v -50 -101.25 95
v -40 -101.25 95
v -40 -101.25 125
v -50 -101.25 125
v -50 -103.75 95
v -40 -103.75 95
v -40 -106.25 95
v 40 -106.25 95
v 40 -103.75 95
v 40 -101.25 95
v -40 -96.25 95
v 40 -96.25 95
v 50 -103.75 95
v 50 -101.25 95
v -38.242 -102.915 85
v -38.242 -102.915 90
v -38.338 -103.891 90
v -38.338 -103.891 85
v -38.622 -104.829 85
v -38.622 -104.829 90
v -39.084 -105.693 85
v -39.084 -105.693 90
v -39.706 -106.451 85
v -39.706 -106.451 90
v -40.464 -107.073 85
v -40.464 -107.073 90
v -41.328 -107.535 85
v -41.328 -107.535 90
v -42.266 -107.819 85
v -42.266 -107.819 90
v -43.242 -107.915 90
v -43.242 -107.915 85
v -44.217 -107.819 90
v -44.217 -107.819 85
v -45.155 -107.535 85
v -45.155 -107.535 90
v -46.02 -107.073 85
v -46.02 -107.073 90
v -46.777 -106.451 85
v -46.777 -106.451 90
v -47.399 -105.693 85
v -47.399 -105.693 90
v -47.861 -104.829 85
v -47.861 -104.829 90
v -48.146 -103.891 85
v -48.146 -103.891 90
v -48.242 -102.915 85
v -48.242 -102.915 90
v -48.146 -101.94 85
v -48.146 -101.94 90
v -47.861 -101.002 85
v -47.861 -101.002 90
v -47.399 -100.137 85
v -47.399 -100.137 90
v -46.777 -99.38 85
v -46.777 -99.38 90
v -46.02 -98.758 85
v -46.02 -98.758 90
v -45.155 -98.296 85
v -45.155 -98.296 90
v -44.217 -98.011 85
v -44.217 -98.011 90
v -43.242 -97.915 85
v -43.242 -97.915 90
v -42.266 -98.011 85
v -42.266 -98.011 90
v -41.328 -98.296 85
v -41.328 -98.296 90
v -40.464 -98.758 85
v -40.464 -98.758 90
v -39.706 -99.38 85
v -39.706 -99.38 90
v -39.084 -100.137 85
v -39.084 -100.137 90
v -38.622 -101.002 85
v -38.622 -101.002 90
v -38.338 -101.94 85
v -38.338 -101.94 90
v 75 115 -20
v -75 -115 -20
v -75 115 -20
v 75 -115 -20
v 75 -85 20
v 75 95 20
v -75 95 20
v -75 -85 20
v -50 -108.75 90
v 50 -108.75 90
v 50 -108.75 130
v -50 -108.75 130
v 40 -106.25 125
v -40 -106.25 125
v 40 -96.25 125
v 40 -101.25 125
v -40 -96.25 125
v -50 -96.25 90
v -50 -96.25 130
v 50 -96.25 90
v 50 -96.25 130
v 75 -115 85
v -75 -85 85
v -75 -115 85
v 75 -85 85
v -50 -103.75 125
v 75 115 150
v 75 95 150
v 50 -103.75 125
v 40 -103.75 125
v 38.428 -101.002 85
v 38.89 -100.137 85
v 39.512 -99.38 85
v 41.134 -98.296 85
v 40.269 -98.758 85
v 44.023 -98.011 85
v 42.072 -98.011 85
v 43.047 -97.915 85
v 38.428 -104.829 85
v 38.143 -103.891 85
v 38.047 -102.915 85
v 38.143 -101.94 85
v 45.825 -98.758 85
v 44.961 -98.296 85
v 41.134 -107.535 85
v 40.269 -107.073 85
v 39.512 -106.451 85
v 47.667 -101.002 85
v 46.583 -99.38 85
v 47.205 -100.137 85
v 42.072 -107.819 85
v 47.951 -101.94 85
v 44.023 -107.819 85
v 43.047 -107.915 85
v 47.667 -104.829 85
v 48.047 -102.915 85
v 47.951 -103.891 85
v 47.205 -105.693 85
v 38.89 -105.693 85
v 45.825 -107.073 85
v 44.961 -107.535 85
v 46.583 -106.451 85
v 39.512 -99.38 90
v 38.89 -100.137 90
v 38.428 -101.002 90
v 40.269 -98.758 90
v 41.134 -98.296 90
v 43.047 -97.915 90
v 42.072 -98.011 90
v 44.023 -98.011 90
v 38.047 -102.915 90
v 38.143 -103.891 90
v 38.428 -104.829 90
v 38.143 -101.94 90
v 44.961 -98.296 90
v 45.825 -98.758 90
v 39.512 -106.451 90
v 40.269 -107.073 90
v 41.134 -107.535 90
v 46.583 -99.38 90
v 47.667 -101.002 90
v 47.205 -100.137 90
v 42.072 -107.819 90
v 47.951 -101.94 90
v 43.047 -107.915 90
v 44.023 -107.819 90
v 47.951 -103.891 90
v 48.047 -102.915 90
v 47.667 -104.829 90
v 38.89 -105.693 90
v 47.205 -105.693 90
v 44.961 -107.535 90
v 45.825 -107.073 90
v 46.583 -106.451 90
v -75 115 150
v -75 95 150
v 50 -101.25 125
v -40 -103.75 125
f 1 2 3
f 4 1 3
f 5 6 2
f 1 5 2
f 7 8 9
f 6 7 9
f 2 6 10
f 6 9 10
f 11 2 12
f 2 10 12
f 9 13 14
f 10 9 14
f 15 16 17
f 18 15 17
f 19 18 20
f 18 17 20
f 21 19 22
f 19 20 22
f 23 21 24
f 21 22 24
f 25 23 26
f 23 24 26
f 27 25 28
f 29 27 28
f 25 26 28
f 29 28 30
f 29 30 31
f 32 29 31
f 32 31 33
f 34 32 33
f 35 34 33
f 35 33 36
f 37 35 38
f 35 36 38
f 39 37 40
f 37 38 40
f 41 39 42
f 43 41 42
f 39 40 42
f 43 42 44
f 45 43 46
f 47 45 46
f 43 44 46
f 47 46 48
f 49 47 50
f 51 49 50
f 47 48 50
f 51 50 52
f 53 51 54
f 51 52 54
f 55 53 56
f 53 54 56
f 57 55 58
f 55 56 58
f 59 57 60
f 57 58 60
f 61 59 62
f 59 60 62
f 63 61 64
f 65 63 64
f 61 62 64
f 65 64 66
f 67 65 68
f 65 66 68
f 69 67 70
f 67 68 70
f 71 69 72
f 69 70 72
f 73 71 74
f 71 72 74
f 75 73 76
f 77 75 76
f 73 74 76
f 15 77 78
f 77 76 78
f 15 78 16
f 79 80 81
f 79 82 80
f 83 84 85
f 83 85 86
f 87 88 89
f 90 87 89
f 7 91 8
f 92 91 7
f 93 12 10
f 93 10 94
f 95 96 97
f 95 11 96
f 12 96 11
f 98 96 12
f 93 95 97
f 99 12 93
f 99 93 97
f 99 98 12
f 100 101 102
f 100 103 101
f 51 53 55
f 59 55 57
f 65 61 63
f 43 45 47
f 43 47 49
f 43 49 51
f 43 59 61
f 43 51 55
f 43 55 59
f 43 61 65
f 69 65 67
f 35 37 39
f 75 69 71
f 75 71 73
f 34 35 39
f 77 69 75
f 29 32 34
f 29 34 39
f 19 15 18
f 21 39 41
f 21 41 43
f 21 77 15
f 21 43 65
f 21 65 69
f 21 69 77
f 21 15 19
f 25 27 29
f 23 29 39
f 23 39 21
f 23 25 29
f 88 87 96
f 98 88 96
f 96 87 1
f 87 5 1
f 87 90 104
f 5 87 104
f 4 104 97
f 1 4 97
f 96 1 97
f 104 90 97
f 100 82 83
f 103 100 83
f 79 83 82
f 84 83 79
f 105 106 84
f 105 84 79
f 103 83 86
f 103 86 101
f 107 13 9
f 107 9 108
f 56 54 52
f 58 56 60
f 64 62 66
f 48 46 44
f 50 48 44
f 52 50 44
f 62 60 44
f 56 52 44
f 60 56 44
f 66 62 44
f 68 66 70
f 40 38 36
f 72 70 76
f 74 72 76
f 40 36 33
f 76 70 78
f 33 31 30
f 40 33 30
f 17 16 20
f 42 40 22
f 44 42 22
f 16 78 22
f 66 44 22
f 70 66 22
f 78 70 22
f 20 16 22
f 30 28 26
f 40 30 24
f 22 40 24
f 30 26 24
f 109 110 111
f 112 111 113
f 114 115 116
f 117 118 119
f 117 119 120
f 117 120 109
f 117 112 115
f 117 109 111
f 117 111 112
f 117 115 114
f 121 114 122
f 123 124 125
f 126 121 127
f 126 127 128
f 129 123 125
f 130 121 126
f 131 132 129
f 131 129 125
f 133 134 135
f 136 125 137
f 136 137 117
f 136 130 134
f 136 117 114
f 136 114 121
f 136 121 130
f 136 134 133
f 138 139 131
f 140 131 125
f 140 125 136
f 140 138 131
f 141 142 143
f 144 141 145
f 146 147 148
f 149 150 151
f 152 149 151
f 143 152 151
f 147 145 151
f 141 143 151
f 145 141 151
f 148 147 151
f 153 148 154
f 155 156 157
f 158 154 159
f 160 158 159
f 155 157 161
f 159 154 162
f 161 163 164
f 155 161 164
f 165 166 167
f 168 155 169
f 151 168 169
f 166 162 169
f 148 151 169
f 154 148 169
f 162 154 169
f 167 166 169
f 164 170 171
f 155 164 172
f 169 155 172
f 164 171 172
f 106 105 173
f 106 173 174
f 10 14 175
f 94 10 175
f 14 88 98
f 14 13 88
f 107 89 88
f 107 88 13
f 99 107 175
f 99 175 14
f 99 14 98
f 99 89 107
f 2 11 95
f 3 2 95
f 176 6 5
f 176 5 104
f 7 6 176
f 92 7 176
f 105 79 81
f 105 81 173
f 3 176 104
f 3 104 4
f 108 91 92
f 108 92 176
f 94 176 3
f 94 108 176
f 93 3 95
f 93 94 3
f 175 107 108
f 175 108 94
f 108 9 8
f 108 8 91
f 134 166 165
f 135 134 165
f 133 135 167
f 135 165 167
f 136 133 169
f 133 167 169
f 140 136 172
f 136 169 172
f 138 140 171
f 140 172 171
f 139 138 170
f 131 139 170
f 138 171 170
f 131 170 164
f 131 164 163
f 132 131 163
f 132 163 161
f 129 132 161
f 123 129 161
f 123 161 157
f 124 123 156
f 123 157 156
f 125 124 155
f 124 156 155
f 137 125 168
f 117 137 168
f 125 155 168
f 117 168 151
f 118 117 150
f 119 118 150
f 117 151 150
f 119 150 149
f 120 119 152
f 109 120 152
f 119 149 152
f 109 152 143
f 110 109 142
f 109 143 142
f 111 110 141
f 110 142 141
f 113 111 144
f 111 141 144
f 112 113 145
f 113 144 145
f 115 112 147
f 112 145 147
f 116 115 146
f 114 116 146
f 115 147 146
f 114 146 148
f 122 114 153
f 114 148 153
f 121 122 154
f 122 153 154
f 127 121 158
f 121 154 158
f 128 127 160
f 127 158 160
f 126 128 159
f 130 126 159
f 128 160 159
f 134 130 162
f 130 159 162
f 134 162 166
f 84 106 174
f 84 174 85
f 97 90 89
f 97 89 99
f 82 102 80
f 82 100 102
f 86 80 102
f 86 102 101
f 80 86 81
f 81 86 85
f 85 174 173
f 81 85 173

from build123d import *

# Parameters (mm, degrees)
F1_DEPTH = 75
F2_W     = 12.5
F2_H     = 40
F2_W_2   = 2.5
F2_H_2   = 30
F3_DEPTH = 50
F4_W     = 80
F4_H     = 30
F5_DEPTH = 10
F6_R     = 5
F7_DEPTH = 5


with BuildPart() as f1:
    # F0 (on Right) → F1 (new body, symmetric)
    with BuildSketch(Plane.YZ):
        Polygon((-115, 20), (-115, -20), (115, -20), (115, 20), (115, 150), (95, 150), (95, 20), (-85, 20), (-85, 85), (-115, 85), align=None)
    extrude(amount=F1_DEPTH, both=True)


with BuildPart() as f3:
    # F2 (on Right) → F3 (new body, symmetric)
    with BuildSketch(Plane.YZ):
        with Locations((-102.5, 110)):
            Rectangle(F2_W, F2_H)
        with Locations((-102.5, 110)):
            Rectangle(F2_W_2, F2_H_2, mode=Mode.SUBTRACT)
    extrude(amount=F3_DEPTH, both=True)

    # F4 (on face) → F5 (cut)
    with BuildSketch(Plane(origin=(0, -96.25, 0), x_dir=(-1, 0, 0), z_dir=(0, 1, 0))):
        with Locations((0, 110)):
            Rectangle(F4_W, F4_H)
    extrude(amount=-F5_DEPTH, mode=Mode.SUBTRACT)


with BuildPart() as f7:
    # F6 (on face) → F7 (new body, through all)
    with BuildSketch(Plane(origin=(0, 0, 90), x_dir=(1, 0, 0), z_dir=(0, 0, -1))):
        with Locations((43.047235, 102.915294)):
            Circle(F6_R)
        with Locations((-43.241718, 102.915294)):
            Circle(F6_R)
    extrude(amount=F7_DEPTH)


solid = Compound([f1.part, f3.part, f7.part])
